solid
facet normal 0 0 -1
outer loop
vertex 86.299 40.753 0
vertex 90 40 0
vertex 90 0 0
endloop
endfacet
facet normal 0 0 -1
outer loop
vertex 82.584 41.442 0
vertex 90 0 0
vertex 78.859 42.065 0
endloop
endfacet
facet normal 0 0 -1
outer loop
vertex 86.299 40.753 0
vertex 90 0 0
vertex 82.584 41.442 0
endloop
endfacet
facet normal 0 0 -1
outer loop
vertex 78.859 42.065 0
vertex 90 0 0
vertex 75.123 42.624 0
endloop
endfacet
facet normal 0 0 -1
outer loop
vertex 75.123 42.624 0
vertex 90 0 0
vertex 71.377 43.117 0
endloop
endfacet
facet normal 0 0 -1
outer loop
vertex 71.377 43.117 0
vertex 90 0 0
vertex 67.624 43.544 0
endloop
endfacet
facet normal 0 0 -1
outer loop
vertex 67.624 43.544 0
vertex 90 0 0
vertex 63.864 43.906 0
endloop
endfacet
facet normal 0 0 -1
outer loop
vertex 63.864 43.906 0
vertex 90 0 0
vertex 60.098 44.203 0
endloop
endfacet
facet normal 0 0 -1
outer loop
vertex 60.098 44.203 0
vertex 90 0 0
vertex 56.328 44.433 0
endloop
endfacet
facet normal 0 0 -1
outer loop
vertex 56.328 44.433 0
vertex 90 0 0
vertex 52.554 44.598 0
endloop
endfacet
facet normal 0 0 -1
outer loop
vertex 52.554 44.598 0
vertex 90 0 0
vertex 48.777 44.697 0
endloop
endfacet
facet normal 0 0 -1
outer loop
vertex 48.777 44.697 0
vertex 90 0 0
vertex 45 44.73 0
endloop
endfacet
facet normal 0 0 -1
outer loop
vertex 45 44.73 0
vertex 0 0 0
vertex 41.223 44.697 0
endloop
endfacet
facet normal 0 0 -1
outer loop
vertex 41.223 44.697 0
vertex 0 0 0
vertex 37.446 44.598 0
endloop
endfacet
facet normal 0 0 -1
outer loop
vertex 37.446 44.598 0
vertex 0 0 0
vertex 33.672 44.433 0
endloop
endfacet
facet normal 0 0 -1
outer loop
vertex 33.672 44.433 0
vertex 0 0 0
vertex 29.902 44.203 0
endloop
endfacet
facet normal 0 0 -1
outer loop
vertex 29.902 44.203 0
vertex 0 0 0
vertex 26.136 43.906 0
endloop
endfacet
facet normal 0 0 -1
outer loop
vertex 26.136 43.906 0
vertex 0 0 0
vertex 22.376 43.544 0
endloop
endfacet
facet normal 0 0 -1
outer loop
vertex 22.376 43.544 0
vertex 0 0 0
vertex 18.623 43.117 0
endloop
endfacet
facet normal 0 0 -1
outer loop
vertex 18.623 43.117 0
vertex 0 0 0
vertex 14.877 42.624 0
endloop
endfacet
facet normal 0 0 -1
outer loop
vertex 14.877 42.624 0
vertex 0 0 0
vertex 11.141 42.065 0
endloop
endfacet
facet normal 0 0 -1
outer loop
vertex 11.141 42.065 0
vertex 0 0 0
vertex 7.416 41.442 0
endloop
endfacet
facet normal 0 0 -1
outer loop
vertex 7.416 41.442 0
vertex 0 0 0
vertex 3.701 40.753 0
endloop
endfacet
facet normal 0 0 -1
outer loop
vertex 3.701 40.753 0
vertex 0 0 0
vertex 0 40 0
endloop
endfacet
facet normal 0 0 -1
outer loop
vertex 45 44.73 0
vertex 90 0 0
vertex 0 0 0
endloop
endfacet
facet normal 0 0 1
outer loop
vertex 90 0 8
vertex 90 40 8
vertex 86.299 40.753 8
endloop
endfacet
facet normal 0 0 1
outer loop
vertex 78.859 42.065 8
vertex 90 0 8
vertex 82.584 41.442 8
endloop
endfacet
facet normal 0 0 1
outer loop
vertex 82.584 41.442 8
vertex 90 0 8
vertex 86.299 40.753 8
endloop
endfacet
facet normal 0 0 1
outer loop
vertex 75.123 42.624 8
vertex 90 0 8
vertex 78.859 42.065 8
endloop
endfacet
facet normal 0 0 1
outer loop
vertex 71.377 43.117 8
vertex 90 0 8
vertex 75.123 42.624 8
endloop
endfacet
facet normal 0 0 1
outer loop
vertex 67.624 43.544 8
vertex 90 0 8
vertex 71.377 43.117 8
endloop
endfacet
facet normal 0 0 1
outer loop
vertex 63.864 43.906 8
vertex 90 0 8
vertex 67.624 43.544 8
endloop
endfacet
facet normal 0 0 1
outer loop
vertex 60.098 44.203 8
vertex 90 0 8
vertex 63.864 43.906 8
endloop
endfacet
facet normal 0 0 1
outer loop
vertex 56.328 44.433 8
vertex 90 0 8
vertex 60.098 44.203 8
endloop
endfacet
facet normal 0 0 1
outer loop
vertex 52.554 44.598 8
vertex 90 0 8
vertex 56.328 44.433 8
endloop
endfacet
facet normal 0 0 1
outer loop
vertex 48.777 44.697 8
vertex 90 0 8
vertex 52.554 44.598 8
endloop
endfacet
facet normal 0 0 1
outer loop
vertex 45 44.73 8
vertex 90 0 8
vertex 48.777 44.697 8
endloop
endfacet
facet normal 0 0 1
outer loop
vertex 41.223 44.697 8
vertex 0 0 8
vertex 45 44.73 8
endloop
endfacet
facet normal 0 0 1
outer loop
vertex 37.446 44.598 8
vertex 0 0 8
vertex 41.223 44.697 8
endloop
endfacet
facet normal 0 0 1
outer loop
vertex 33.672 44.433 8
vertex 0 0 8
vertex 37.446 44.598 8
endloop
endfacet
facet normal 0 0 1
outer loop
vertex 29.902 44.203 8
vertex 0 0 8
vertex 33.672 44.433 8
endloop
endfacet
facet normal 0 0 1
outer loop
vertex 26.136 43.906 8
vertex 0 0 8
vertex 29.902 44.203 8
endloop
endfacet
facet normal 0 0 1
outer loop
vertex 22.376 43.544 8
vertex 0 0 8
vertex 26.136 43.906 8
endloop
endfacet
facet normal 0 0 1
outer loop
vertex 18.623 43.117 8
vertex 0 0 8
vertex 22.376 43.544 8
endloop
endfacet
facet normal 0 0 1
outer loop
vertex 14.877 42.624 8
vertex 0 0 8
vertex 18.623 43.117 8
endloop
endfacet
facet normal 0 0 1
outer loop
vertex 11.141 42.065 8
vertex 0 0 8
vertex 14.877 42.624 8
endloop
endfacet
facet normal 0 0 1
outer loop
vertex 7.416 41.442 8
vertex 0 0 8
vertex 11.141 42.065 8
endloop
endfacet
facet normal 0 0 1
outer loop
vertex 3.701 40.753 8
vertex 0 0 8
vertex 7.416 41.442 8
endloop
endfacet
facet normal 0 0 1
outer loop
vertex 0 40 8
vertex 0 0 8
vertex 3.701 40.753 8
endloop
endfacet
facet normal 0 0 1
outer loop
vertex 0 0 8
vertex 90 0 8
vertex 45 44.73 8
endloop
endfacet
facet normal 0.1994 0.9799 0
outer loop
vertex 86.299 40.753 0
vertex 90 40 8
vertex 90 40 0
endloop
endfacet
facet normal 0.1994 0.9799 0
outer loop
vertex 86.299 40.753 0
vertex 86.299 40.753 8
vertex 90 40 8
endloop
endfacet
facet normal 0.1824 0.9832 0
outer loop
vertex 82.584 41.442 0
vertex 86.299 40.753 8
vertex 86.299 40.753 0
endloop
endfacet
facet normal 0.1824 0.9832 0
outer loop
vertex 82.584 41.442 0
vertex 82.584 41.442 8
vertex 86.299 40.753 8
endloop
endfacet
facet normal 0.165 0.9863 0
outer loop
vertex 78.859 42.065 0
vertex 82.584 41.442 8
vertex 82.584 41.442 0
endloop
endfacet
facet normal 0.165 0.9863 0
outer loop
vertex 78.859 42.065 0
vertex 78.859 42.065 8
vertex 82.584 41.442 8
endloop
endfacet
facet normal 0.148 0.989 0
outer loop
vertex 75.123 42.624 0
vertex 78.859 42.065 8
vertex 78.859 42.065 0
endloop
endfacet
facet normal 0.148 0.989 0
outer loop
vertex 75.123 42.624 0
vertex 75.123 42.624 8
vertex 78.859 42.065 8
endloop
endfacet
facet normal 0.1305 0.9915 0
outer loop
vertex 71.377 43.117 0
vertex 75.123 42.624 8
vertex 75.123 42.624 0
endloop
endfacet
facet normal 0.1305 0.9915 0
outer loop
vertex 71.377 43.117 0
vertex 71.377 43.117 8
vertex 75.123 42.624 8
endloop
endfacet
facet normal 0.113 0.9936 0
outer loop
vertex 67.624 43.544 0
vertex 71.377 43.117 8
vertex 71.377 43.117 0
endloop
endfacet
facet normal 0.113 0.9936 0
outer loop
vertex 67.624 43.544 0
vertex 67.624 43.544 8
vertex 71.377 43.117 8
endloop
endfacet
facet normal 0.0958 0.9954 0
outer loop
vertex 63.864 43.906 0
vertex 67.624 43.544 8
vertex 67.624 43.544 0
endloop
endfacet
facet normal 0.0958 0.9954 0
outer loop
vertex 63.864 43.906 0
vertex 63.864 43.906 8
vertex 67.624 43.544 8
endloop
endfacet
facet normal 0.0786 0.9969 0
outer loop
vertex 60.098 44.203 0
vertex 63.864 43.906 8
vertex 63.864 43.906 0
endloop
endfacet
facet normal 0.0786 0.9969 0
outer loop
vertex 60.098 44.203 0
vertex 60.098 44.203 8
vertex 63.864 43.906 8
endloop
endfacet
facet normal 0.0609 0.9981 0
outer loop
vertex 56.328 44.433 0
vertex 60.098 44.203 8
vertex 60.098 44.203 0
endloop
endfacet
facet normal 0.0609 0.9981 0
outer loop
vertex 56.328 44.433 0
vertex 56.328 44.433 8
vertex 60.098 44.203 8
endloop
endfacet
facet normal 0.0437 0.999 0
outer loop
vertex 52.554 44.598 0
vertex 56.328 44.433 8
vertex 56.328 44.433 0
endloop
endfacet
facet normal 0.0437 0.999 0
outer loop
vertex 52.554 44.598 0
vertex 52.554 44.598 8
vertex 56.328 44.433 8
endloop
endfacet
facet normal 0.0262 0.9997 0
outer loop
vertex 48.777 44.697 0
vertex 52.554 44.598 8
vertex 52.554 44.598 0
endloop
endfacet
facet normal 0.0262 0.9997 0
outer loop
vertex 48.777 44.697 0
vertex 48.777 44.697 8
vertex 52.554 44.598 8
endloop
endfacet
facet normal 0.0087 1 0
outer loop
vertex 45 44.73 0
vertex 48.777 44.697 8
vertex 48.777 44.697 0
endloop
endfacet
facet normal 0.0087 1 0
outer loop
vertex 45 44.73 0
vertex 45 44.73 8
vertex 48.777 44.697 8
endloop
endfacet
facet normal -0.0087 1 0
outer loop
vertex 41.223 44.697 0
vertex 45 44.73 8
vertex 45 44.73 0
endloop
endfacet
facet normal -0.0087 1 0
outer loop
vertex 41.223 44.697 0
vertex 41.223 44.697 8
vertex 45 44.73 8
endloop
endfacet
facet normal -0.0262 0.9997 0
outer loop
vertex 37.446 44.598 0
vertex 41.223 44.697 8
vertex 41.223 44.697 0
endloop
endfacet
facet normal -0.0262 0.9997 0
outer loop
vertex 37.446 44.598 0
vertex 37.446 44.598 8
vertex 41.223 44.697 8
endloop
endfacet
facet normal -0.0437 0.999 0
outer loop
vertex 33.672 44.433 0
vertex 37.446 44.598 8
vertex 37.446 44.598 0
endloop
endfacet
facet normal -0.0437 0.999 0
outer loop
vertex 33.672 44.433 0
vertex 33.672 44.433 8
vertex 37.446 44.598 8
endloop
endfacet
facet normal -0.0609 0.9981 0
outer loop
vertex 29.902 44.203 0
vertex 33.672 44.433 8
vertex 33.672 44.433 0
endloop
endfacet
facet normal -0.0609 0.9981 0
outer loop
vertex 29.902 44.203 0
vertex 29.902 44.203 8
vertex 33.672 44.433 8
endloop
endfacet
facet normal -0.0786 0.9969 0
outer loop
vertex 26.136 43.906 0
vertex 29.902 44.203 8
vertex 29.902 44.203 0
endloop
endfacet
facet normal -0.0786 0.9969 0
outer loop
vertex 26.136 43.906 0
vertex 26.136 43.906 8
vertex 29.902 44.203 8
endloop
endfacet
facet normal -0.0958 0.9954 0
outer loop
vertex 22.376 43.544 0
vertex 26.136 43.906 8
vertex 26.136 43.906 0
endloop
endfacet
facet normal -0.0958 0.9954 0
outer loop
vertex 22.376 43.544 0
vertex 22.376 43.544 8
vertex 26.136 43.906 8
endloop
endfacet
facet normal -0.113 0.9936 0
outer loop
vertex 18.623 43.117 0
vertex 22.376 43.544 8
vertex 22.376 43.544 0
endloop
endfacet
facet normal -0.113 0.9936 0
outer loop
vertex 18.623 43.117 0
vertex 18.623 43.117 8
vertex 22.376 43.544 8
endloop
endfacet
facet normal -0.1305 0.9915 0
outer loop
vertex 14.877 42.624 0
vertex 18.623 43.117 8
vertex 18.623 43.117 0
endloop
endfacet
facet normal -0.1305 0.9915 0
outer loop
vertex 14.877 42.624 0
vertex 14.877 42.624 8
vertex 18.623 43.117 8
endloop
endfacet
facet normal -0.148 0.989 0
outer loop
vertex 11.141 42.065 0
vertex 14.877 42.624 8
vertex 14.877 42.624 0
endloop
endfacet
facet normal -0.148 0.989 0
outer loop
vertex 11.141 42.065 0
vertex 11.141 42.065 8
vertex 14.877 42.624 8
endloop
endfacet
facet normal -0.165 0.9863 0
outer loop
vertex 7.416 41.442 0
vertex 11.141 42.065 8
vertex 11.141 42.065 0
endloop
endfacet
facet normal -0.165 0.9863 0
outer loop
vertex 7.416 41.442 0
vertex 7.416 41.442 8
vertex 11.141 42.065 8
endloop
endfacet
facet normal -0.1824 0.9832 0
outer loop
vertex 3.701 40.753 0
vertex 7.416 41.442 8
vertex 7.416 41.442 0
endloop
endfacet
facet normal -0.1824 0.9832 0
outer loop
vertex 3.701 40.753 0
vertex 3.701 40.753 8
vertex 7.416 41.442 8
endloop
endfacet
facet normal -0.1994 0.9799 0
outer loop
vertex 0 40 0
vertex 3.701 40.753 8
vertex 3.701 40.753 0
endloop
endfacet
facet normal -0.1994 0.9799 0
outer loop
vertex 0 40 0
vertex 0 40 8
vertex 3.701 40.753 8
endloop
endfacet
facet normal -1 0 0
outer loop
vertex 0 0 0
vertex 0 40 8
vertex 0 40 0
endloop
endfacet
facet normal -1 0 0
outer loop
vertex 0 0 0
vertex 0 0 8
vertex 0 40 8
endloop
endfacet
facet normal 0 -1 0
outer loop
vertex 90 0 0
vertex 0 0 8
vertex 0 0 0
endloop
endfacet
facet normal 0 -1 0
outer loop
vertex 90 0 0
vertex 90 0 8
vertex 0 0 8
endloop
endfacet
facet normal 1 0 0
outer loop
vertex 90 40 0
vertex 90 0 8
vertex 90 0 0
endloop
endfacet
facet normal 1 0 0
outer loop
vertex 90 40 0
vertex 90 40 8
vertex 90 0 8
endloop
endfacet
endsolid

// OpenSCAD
$fn = 32;

// ----------------------------------------------------------------------
// Arc profile plate: crown, 27 points
// ----------------------------------------------------------------------

// --- parameters (mm) ---
bar_l = 90;               // bar length, X
bar_w = 40;               // bar height at the ends, Y
arc_r = 216.44;           // radius of the crown arc
arc_angle = 24;           // crown arc angle, degrees
crown_rise = 4.73;        // rise of the crown over the ends
arc_step = 1;             // sampling step of the crown arc, degrees
plate_t = 8;              // plate thickness, Z

bbox_y = bar_w + crown_rise;  // full height with the crown

profile = [[90, 40], [86.299, 40.753], [82.584, 41.442], [78.859, 42.065], [75.123, 42.624], [71.377, 43.117], [67.624, 43.544], [63.864, 43.906], [60.098, 44.203], [56.328, 44.433], [52.554, 44.598], [48.777, 44.697], [45, 44.73], [41.223, 44.697], [37.446, 44.598], [33.672, 44.433], [29.902, 44.203], [26.136, 43.906], [22.376, 43.544], [18.623, 43.117], [14.877, 42.624], [11.141, 42.065], [7.416, 41.442], [3.701, 40.753], [0, 40], [0, 0], [90, 0]];  // primary outline, 27 points, counter clockwise

// --- the one profile operation ---
linear_extrude(height = plate_t) polygon(points = profile);
